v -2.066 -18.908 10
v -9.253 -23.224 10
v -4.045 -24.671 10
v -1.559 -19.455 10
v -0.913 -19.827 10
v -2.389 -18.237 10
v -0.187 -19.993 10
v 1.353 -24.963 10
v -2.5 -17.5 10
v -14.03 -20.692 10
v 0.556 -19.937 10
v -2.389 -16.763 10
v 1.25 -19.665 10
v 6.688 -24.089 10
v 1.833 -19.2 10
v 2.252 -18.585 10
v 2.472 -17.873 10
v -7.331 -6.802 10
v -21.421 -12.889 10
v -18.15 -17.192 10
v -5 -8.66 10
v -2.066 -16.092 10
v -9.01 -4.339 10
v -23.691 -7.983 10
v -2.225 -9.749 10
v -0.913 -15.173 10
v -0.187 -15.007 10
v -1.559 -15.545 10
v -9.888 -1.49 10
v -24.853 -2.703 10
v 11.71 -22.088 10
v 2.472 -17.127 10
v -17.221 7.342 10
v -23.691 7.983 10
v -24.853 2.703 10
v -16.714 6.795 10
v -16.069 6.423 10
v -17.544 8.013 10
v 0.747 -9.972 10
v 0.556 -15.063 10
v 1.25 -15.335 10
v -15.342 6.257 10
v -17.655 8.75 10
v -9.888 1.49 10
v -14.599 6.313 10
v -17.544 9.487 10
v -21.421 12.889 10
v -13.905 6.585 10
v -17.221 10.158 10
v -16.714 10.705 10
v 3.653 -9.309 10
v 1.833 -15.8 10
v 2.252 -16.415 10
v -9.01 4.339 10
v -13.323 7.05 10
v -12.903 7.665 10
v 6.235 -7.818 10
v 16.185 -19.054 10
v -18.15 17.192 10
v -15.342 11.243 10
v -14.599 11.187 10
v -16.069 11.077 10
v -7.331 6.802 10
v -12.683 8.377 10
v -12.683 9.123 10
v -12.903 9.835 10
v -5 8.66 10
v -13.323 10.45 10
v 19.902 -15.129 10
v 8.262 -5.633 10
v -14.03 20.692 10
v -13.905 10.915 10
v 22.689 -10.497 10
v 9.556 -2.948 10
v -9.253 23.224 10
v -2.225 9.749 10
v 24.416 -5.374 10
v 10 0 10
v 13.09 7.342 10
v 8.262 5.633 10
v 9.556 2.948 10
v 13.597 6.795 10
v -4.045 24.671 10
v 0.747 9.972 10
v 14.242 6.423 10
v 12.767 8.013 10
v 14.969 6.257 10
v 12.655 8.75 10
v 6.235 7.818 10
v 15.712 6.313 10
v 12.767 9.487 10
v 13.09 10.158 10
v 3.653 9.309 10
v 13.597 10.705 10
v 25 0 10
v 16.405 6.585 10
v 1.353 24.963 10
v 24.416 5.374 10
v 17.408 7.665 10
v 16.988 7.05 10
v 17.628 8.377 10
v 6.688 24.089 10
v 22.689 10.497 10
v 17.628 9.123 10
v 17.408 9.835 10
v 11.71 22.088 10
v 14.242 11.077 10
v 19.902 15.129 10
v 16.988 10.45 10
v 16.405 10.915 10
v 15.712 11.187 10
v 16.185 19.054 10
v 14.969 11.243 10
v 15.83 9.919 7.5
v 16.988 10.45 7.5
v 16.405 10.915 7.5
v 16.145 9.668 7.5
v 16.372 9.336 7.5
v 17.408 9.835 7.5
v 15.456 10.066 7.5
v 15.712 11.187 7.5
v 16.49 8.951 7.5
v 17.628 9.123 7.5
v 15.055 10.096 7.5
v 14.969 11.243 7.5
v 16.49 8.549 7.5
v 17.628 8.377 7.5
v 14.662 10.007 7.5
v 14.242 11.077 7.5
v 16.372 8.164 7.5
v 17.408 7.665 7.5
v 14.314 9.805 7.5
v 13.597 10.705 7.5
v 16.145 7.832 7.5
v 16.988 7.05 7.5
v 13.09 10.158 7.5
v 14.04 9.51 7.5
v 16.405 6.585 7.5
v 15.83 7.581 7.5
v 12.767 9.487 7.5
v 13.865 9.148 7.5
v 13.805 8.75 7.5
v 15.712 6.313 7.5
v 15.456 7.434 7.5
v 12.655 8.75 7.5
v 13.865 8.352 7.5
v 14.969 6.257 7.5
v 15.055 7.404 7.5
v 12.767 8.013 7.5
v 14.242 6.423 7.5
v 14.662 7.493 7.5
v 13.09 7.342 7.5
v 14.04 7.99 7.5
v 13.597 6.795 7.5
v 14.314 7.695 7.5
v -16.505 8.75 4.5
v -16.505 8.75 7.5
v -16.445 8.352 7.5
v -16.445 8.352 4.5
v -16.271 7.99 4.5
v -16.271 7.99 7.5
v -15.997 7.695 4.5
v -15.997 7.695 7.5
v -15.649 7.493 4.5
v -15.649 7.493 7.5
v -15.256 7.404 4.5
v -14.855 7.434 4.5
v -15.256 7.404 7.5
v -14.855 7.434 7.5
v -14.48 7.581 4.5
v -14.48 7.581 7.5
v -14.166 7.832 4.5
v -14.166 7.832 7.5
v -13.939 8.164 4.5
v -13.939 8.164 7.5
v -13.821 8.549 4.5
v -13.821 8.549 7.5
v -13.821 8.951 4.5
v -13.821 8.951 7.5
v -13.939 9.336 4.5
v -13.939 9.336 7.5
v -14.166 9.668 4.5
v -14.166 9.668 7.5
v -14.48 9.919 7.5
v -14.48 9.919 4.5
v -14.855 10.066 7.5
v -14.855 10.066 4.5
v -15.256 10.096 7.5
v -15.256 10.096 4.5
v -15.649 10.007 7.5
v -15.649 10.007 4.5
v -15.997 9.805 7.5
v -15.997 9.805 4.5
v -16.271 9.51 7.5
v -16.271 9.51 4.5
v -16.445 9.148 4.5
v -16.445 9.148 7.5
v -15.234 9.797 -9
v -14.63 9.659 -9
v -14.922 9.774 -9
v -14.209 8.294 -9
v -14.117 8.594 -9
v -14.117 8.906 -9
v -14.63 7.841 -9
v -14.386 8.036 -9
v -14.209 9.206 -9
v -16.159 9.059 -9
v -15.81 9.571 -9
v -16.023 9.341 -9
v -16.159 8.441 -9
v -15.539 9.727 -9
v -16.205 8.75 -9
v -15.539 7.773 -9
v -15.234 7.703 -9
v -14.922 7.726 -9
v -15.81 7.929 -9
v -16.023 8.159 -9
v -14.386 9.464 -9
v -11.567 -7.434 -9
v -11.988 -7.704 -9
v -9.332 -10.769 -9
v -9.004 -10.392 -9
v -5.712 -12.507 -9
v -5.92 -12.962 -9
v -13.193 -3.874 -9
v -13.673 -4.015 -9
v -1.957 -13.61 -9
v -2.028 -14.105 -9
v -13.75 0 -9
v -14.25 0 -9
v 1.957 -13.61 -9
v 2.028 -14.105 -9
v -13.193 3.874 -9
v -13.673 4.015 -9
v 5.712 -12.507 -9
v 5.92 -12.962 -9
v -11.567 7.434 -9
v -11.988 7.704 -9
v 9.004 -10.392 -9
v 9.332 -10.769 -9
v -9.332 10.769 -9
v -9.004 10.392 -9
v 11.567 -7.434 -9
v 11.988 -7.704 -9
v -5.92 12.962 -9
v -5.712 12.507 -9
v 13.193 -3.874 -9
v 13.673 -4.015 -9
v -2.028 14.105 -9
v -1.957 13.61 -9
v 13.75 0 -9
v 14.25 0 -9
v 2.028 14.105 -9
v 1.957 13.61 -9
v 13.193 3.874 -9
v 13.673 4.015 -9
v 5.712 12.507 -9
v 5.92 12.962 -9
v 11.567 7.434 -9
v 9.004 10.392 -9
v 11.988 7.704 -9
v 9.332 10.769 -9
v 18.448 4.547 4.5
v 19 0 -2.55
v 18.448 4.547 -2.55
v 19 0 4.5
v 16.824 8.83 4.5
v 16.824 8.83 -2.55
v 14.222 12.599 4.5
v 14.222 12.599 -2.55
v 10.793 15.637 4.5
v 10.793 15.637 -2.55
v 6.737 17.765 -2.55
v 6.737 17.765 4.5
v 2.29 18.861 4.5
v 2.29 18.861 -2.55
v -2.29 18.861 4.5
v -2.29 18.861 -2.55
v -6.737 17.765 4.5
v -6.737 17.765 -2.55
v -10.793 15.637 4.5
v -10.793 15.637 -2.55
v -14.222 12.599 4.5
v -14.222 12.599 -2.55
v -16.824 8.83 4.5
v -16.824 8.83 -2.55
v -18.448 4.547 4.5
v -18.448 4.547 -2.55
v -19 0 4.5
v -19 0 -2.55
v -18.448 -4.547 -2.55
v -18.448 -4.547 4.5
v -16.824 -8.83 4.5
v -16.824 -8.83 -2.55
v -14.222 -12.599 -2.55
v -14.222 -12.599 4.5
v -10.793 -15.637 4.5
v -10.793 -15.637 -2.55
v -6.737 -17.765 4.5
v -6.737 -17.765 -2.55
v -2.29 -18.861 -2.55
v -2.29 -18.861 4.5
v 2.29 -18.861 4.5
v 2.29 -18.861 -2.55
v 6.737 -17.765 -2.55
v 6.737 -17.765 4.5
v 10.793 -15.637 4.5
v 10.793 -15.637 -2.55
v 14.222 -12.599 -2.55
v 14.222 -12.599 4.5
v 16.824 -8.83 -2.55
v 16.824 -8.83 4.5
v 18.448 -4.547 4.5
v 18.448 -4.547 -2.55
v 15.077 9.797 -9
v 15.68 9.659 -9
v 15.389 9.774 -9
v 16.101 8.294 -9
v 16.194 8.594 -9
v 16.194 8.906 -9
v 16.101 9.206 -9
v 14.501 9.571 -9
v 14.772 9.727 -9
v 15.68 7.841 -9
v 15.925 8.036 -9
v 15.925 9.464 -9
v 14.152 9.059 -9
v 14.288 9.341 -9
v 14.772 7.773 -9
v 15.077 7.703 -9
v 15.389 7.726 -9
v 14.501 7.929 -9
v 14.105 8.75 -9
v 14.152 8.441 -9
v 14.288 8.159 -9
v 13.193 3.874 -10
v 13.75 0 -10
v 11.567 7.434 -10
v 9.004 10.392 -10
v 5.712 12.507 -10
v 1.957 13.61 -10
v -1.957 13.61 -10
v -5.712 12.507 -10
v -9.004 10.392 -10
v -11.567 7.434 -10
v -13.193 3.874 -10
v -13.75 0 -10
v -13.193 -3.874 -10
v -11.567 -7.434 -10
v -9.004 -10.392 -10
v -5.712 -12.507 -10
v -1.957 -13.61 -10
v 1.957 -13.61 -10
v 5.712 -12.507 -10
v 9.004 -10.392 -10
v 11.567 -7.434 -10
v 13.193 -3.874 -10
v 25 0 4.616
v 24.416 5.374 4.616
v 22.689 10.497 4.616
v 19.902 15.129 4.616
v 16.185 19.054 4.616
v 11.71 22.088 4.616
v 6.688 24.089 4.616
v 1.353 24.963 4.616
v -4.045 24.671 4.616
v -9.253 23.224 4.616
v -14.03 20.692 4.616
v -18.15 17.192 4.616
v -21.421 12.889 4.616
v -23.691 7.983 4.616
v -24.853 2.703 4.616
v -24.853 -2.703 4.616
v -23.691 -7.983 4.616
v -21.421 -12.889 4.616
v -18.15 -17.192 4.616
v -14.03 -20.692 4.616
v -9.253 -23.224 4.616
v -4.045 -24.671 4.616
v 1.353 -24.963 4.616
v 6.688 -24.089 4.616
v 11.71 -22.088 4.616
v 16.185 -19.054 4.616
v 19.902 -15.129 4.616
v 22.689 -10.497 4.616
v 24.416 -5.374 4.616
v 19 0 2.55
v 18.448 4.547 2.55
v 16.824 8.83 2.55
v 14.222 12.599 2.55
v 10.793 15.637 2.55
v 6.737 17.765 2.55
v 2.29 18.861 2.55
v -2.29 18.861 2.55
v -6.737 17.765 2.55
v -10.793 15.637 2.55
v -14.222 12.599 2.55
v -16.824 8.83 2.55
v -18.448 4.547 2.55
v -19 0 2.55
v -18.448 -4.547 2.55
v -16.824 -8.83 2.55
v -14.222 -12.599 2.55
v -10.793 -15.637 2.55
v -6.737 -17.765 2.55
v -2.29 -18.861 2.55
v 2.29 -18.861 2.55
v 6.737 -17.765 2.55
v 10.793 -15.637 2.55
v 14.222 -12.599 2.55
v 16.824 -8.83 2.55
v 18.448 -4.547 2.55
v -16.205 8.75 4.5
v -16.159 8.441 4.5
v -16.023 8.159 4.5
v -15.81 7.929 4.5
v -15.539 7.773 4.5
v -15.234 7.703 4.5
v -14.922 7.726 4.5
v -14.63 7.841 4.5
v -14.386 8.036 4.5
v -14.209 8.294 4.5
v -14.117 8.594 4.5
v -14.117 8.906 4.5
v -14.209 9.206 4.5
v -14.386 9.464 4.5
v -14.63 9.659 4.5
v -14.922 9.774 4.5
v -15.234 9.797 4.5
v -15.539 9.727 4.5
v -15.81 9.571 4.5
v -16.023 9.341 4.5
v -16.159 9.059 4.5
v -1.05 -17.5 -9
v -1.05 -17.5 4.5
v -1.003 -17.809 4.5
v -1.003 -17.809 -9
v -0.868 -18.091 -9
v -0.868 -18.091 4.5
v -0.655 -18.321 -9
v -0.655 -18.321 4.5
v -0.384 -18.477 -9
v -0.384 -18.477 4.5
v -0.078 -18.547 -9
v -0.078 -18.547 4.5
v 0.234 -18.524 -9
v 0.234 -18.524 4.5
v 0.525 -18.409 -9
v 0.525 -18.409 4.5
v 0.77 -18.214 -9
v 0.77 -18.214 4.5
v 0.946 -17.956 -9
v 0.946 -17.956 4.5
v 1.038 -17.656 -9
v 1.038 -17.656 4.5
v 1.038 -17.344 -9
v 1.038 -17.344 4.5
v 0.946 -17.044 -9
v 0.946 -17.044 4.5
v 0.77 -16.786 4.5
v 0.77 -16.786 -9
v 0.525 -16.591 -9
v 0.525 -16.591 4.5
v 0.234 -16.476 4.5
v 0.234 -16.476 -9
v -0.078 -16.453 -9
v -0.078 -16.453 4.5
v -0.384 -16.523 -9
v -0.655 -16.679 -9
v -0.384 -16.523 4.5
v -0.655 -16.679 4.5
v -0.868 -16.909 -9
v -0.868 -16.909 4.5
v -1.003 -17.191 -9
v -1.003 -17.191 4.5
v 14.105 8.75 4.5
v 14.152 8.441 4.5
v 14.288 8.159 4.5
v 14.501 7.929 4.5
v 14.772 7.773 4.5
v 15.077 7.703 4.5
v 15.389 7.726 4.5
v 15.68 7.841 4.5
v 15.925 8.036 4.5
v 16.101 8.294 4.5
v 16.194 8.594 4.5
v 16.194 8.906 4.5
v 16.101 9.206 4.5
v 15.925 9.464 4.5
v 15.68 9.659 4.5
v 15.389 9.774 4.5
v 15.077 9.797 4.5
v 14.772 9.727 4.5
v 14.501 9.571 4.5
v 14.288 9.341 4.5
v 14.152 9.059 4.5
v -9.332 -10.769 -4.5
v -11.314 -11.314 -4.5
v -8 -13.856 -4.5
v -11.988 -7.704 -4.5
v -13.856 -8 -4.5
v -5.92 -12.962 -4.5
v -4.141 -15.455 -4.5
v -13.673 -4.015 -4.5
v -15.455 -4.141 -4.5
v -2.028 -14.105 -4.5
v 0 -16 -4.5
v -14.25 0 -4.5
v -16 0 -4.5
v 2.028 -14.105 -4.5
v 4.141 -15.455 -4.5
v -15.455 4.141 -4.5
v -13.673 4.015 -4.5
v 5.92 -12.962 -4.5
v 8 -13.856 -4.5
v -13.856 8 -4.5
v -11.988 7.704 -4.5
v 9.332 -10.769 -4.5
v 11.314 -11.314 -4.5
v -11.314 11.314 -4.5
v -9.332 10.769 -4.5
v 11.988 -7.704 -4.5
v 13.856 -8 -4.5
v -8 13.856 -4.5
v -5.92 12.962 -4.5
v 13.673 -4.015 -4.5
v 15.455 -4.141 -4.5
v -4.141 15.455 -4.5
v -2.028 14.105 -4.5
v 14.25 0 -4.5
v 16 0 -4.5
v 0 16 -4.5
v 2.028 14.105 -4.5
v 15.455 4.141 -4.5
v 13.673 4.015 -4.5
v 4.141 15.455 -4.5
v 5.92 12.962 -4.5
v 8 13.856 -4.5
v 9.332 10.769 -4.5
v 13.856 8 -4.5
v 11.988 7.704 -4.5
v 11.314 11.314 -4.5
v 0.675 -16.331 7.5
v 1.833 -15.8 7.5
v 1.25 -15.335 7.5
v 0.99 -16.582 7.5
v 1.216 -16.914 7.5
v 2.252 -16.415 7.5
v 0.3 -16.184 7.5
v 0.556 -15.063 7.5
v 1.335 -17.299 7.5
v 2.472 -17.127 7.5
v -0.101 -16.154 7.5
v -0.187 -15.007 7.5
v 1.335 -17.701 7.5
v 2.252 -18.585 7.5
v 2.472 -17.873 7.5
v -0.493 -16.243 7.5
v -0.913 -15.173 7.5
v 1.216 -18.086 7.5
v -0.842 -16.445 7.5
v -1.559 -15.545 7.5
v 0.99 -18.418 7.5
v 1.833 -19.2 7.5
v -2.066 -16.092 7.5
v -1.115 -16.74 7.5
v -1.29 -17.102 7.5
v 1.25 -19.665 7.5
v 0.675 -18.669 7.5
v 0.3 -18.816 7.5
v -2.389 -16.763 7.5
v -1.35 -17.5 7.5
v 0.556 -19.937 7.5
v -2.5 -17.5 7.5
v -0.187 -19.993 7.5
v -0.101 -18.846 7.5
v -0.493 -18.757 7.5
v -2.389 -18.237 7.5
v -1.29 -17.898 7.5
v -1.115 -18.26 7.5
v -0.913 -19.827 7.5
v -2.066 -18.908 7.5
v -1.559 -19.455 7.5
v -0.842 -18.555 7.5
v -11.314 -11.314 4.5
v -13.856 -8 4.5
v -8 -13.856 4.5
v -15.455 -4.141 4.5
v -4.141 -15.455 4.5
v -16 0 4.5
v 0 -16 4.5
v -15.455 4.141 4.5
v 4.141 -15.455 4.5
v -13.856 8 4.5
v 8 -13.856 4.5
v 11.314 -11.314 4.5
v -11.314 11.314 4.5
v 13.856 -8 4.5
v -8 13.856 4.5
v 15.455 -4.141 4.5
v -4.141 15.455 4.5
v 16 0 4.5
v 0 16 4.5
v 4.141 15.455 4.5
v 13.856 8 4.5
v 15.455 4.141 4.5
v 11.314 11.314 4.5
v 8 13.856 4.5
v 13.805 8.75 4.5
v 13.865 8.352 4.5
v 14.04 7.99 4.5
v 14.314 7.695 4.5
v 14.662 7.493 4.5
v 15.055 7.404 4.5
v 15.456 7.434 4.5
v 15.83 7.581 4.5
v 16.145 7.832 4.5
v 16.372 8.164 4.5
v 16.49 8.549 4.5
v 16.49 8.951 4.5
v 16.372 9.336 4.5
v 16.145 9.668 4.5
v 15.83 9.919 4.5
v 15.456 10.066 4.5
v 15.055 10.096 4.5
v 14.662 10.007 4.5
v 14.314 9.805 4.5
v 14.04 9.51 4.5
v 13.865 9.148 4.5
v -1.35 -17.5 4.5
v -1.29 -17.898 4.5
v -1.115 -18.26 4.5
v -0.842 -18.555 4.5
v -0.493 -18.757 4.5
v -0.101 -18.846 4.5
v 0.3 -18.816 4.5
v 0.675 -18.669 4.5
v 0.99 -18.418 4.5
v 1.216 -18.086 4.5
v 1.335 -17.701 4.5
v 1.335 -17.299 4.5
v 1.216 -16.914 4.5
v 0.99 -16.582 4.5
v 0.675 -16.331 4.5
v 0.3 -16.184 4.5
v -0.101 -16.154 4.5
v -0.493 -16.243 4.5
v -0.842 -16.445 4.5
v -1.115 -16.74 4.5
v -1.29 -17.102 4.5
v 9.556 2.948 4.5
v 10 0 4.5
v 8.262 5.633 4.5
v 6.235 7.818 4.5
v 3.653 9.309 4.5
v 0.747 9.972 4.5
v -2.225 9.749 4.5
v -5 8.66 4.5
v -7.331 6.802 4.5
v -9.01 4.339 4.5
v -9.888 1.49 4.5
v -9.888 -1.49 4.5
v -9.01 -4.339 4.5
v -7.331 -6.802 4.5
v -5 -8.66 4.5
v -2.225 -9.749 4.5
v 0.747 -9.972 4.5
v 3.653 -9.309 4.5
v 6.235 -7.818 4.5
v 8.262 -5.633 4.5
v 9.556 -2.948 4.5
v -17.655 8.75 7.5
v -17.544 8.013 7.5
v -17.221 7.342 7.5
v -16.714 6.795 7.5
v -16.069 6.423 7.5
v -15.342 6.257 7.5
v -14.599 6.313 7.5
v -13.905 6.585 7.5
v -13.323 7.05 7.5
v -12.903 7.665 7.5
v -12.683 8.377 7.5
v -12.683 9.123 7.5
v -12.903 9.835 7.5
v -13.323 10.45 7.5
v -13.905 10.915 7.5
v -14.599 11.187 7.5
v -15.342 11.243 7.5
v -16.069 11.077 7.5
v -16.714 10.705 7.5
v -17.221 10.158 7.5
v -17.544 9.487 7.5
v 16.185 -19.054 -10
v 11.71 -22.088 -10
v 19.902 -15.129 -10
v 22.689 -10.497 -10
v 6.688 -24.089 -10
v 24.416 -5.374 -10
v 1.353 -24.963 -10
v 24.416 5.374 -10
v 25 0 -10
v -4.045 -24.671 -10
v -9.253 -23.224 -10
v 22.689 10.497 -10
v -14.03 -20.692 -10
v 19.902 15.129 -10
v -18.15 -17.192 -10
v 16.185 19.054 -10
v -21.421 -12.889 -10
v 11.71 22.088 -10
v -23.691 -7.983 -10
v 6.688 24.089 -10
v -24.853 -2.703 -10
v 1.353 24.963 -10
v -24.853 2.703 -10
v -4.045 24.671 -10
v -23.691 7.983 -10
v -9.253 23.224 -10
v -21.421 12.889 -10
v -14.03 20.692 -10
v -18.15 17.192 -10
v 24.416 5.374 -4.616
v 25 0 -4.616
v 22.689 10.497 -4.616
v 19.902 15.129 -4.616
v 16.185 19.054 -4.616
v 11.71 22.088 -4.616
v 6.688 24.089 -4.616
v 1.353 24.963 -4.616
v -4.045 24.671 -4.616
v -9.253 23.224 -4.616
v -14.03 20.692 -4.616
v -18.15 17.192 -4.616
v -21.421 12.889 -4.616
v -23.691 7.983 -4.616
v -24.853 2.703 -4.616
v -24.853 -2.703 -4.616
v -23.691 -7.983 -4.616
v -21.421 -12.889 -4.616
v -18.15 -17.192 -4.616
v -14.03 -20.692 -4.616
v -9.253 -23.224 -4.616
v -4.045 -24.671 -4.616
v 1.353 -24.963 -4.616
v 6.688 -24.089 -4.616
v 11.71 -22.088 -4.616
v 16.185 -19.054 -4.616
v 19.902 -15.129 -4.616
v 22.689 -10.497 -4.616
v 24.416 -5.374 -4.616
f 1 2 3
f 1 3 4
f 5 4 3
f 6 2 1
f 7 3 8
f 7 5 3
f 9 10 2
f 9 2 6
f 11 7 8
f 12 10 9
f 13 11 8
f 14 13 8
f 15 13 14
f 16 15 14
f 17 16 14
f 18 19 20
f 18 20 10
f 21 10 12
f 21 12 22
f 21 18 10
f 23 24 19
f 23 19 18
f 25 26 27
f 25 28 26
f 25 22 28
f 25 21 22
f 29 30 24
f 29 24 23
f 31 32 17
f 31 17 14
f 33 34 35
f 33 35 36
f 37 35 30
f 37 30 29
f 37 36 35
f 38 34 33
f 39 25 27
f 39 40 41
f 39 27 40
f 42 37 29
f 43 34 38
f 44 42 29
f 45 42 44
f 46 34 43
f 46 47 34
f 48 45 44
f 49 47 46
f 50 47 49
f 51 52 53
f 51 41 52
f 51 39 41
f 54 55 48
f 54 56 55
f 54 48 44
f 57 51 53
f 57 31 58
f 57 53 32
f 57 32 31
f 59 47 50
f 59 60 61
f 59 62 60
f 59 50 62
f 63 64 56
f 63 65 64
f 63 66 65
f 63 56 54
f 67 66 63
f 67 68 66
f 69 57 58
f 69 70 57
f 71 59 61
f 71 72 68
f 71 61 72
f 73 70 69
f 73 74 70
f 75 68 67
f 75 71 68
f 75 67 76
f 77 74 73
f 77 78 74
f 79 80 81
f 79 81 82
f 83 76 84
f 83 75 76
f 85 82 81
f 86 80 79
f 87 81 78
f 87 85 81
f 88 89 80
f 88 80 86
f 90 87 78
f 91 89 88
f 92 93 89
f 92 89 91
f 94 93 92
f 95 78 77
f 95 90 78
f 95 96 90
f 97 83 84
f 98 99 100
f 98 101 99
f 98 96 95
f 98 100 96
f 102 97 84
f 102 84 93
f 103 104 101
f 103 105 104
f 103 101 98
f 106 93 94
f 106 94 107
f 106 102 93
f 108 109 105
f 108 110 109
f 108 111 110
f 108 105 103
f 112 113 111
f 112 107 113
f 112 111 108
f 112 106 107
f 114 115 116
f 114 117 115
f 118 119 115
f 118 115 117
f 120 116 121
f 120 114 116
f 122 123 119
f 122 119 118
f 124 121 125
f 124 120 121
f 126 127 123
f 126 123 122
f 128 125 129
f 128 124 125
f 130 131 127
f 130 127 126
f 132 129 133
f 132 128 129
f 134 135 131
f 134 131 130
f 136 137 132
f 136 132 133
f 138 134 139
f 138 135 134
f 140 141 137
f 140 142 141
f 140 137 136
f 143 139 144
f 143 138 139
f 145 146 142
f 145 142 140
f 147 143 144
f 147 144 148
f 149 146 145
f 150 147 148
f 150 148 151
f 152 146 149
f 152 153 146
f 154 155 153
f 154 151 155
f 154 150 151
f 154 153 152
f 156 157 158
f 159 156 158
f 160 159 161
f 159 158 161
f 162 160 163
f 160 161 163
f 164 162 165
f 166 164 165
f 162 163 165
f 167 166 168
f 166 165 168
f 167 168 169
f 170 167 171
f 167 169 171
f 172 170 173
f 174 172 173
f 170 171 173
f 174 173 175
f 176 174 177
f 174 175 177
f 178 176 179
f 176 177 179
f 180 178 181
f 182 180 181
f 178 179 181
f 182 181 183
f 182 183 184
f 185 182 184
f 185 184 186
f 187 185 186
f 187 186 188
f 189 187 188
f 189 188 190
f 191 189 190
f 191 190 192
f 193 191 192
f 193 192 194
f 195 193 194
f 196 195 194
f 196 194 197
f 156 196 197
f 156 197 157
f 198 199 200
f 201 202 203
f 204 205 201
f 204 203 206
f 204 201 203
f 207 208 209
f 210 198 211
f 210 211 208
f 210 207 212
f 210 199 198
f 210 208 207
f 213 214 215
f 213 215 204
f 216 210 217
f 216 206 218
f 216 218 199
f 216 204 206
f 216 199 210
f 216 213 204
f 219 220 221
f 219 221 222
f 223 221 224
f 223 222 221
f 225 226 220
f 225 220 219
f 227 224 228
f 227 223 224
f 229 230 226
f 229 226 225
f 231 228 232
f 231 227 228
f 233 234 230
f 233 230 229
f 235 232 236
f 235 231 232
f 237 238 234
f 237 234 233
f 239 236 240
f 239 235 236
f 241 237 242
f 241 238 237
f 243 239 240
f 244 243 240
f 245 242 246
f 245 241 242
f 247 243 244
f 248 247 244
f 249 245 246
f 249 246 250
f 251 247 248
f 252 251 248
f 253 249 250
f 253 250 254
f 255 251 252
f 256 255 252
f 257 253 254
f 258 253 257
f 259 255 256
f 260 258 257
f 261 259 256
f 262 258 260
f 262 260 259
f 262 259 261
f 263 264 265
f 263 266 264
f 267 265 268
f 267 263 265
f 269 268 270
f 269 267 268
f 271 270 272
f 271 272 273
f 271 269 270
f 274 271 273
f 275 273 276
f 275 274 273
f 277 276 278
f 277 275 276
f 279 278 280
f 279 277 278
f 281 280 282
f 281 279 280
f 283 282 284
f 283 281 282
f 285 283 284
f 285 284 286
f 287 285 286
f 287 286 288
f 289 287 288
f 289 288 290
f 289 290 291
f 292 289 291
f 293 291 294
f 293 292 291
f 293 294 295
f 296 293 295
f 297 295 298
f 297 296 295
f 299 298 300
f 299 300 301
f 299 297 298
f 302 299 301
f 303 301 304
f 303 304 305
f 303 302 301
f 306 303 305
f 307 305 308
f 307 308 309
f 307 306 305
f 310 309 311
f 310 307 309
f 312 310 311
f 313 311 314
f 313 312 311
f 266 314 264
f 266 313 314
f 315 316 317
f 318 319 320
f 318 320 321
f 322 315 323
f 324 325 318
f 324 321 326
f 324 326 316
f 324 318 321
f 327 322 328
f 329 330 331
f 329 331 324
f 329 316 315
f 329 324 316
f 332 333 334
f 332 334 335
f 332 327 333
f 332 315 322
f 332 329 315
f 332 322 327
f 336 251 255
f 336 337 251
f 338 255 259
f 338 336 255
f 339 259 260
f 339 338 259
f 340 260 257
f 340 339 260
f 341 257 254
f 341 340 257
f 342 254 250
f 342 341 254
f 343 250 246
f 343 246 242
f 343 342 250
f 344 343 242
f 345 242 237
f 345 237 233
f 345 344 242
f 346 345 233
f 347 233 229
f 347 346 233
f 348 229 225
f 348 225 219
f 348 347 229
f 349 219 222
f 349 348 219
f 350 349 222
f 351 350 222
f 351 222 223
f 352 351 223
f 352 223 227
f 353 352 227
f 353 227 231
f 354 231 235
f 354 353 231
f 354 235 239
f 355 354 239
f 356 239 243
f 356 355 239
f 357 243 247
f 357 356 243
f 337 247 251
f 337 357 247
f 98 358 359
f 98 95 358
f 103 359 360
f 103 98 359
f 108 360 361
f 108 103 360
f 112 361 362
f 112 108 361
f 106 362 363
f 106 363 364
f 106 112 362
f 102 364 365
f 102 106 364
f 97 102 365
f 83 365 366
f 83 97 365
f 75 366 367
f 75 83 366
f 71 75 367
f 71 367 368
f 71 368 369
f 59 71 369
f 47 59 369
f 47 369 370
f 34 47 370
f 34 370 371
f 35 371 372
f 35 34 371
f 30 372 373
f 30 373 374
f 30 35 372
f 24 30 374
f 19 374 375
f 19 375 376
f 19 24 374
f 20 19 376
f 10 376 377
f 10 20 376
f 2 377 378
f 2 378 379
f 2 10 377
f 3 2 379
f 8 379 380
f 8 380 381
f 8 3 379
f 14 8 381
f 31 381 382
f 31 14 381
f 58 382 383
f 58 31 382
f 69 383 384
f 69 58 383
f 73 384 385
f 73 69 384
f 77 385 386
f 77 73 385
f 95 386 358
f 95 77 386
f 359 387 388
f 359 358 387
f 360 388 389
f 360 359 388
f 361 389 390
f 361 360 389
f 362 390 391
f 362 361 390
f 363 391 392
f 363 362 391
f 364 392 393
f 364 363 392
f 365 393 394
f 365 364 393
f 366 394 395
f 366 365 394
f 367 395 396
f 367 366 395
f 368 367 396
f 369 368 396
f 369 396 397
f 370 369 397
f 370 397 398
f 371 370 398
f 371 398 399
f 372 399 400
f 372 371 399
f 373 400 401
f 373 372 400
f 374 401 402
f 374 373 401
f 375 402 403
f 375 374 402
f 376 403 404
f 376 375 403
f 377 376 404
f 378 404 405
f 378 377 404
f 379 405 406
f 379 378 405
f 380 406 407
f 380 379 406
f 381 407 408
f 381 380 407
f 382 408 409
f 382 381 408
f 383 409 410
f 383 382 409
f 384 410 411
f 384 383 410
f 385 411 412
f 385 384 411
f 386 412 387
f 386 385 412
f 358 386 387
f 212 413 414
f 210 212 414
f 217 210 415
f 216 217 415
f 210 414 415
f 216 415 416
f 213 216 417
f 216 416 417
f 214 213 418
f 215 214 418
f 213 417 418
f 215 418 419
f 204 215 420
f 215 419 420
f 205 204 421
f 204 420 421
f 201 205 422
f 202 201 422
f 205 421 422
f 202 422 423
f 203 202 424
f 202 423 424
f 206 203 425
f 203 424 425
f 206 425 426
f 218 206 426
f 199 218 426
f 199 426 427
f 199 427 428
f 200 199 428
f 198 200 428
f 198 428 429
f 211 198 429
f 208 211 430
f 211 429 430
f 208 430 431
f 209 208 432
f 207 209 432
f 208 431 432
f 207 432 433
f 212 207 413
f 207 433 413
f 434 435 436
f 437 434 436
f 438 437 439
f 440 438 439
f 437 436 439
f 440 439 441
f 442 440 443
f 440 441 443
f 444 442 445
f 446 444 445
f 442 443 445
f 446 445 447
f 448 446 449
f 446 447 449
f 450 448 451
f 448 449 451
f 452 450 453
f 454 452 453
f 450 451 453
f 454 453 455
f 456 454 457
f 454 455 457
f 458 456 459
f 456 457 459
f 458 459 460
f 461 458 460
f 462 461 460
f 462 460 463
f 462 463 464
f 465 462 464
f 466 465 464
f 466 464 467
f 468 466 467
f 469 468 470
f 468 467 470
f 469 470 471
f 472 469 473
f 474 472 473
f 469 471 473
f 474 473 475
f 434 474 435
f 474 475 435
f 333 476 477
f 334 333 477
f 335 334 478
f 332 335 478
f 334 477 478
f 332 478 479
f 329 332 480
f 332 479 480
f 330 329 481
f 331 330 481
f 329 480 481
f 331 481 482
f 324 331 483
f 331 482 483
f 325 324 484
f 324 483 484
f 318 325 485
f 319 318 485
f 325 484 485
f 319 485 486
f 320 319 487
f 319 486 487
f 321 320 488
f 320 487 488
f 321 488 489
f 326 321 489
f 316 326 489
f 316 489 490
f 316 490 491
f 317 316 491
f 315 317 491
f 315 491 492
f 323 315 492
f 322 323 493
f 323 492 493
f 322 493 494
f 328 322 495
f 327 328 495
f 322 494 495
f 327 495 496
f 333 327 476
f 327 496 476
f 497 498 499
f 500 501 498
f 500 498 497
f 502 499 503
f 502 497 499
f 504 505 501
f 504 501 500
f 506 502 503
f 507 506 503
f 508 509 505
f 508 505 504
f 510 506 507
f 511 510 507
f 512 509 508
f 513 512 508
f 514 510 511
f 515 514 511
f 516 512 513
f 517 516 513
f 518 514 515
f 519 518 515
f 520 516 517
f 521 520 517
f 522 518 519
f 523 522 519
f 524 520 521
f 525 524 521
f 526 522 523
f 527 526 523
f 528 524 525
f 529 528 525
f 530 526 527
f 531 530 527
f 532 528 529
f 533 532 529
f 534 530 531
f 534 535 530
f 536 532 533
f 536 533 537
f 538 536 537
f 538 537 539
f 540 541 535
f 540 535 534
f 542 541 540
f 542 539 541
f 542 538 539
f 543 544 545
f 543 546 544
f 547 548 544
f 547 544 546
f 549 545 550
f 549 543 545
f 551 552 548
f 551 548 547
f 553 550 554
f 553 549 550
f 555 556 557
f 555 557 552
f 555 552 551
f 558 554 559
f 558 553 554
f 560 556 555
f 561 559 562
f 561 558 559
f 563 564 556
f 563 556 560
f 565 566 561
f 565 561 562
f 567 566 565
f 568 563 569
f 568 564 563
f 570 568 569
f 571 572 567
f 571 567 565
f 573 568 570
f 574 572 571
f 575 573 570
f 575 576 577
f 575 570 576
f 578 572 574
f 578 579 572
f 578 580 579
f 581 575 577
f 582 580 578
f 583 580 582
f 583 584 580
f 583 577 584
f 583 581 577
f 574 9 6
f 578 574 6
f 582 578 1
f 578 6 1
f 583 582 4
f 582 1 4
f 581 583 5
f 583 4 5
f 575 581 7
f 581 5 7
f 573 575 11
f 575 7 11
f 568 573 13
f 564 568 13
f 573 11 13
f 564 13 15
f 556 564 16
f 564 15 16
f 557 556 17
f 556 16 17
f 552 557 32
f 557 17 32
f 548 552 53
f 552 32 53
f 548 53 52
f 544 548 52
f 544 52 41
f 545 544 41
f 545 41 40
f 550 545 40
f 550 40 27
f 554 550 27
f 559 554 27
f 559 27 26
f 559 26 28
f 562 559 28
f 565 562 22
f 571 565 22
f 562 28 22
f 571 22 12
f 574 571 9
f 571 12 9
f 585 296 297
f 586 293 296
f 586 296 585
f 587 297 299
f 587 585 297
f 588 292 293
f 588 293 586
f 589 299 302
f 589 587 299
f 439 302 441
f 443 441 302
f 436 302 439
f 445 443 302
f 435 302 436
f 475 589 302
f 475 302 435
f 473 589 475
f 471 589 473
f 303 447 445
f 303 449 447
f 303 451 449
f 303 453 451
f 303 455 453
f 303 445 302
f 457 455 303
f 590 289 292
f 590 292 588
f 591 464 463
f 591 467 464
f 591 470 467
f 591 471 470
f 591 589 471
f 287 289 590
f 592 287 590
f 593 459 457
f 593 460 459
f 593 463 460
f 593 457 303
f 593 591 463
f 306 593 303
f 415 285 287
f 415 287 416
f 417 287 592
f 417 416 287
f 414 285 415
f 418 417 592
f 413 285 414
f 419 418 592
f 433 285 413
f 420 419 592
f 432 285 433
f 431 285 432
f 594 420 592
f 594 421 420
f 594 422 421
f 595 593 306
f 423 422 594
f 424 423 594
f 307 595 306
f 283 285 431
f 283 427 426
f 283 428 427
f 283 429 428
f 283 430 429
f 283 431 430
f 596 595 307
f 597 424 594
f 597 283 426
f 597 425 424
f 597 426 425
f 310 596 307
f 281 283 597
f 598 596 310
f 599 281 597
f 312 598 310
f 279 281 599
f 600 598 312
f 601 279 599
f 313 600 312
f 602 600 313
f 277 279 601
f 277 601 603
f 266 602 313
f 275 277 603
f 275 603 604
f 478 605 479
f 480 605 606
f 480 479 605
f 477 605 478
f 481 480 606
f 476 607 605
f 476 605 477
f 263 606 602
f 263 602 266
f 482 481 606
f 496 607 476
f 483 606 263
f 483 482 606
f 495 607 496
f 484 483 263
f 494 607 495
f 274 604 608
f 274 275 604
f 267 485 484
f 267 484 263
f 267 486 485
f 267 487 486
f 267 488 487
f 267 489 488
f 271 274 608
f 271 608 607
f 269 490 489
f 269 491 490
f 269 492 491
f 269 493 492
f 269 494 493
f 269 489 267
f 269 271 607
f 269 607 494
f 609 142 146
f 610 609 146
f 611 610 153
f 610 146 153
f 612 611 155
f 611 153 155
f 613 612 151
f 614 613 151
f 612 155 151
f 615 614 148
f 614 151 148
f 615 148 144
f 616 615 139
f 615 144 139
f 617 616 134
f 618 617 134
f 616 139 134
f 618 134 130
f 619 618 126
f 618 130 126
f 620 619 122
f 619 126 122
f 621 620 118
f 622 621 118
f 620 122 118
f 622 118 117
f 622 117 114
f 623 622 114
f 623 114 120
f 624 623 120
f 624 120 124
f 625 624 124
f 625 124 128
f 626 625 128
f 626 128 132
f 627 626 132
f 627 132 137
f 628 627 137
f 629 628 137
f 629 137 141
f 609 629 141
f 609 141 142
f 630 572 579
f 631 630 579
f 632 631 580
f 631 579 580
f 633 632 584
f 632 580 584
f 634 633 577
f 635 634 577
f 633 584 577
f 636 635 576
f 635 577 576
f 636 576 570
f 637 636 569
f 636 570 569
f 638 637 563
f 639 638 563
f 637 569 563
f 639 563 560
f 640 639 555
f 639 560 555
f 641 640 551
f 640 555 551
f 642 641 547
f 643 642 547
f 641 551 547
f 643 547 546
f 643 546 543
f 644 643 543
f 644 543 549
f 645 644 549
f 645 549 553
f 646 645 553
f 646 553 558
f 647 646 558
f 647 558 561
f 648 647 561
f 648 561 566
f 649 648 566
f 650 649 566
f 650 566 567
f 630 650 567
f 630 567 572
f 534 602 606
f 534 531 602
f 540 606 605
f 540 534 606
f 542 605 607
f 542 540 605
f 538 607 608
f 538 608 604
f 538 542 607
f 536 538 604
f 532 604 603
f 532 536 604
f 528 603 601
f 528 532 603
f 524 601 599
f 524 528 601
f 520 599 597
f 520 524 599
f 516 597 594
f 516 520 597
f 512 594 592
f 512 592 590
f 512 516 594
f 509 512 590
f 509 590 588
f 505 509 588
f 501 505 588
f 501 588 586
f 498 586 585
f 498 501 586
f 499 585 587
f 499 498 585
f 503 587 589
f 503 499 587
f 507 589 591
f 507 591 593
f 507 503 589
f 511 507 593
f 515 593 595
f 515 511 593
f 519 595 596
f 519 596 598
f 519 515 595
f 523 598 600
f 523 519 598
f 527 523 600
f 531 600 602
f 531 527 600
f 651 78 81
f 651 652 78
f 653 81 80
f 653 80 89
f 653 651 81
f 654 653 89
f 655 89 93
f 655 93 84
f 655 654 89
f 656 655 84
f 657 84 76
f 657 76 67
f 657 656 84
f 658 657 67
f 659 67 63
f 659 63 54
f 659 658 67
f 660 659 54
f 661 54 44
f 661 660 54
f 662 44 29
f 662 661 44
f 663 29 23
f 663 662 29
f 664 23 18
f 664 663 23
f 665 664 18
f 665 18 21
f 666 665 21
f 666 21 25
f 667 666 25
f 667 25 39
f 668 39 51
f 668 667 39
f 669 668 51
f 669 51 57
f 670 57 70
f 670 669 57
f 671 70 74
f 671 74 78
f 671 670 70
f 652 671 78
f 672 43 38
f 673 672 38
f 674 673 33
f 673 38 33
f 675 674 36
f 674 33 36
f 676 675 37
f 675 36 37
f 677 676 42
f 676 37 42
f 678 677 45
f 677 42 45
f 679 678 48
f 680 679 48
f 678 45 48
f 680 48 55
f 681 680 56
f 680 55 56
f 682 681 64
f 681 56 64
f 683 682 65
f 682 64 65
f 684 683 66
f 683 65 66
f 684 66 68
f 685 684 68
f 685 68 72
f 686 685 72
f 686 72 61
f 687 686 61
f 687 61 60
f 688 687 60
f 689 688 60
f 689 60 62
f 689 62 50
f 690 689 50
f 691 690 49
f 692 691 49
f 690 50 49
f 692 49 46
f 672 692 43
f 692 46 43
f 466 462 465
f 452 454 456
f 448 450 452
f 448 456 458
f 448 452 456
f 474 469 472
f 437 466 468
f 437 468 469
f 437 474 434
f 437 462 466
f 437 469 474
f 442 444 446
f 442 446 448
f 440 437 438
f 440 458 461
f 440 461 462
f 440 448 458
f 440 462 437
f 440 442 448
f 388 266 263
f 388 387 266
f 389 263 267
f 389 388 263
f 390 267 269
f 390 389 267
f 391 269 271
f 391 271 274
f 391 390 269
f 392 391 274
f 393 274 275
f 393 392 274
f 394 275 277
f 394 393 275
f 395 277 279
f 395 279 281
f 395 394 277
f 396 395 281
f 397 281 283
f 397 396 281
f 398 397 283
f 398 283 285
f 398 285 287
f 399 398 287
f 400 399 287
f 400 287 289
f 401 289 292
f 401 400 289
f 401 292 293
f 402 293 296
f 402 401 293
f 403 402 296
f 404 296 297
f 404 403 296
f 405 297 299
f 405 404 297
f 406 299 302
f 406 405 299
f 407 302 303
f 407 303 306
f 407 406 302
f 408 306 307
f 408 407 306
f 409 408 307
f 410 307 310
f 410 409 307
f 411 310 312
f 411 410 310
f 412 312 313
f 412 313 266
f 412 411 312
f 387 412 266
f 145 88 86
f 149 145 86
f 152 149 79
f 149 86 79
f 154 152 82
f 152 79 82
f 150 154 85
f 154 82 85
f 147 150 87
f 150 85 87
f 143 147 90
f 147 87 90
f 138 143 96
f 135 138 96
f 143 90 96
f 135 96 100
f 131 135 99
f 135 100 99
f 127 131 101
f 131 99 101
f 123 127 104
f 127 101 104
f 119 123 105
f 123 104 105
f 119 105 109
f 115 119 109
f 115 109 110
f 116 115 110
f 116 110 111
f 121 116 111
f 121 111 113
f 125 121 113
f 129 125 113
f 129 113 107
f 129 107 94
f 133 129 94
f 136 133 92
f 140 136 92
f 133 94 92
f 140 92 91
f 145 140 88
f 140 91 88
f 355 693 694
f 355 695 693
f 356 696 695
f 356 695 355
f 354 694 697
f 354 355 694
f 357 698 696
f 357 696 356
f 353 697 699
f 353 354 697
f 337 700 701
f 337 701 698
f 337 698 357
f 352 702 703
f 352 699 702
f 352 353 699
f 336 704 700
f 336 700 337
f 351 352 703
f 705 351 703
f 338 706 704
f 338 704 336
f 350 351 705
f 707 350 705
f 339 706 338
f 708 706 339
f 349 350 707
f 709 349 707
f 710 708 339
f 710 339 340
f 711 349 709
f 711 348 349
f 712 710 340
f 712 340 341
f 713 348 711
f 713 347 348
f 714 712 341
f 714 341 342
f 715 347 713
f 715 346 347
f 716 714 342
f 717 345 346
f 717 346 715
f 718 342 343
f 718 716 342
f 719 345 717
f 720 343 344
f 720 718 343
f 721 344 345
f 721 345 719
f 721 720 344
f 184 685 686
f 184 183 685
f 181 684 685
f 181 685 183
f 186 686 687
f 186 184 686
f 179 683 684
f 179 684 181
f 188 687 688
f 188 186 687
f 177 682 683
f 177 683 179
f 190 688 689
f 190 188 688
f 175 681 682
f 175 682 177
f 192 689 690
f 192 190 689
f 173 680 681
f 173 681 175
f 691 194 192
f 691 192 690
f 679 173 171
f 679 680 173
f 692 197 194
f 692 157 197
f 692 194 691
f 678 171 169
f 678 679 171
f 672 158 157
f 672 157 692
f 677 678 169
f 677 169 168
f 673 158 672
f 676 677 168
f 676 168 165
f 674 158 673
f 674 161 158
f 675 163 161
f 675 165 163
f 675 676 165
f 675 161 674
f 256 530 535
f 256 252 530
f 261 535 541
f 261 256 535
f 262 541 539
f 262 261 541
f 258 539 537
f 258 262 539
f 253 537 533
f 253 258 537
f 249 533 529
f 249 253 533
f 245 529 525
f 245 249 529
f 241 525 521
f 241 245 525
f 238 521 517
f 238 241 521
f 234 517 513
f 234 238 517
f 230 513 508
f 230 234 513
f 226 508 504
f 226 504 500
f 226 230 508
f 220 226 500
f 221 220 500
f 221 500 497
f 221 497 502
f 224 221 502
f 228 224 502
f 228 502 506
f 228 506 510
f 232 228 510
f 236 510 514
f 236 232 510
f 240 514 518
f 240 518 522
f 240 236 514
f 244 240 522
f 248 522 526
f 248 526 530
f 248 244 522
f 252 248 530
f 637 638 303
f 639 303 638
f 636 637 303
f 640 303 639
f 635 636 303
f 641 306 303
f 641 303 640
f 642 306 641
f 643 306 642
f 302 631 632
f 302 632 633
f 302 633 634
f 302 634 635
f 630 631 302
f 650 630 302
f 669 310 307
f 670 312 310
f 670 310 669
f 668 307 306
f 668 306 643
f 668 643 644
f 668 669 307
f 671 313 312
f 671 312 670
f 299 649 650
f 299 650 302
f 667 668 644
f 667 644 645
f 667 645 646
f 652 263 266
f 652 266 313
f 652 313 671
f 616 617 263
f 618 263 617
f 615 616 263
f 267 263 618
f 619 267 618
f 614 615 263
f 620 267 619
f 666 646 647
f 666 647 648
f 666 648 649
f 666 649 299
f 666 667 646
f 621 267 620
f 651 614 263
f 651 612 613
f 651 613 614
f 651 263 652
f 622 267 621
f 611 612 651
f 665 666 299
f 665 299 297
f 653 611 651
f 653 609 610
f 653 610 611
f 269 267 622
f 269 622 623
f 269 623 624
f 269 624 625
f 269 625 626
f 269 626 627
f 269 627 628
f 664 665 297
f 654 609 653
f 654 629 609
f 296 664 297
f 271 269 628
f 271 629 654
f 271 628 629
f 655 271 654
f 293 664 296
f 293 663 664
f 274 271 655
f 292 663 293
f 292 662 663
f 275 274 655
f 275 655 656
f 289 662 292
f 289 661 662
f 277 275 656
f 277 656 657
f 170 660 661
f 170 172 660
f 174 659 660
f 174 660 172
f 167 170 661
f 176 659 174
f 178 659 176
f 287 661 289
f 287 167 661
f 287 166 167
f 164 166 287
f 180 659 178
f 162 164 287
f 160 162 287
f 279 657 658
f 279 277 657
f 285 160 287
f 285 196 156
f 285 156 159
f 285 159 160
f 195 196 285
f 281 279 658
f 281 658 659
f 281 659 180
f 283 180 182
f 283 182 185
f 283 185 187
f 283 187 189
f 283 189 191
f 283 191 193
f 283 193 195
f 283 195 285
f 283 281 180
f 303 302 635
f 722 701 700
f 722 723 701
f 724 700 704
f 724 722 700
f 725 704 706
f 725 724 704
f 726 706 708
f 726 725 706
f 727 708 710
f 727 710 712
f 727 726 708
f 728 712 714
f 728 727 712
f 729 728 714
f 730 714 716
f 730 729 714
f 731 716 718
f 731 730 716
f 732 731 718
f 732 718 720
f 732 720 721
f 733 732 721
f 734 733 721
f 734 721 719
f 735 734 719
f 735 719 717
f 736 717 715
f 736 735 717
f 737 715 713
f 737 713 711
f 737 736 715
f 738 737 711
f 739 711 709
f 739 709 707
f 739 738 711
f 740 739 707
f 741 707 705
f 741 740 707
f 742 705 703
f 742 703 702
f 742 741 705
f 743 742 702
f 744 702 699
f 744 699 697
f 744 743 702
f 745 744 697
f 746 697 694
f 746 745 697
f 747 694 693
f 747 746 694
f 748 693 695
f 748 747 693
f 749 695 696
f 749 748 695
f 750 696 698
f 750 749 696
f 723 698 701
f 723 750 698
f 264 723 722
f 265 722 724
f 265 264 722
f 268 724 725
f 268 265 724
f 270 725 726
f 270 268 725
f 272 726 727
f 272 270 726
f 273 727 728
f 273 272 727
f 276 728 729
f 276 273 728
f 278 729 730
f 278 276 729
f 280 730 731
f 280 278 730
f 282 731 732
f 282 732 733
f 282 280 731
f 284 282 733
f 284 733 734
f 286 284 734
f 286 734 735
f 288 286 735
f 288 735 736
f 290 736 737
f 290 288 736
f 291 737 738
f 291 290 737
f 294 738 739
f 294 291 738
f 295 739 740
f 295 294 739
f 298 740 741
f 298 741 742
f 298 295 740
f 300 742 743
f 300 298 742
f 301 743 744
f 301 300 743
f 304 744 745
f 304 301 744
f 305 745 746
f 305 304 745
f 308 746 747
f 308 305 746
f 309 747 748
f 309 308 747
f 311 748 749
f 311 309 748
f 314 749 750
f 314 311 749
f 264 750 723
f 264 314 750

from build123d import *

# Parameters (mm, degrees)
SKETCH003_R     = 1.05
POCKET001_DEPTH = 13.5
SKETCH004_R     = 1.35
POCKET_DEPTH    = 7.451
SKETCH005_R     = 2.5
POCKET002_DEPTH = 2.5


with BuildPart() as f_2_screwholes_pocket:
    # Sketch → Revolution001 (revolve)
    with BuildSketch(Plane.XZ):
        Polygon((13.75, -10), (25, -10), (25, -4.615966), (19, -2.55), (19, 4.5), (16, 4.5), (16, -4.5), (14.25, -4.5), (14.25, -9), (13.75, -9), align=None)
    revolve(axis=Axis((0, 0, 0), (0, 0, 1)))

    # Sketch003 → Pocket001 (cut)
    with BuildSketch(Plane(origin=(0, 0, 4.5), x_dir=(-1, 0, 0), z_dir=(0, 0, 1))):
        with Locations((0, 17.5)):
            Circle(SKETCH003_R)
        with Locations((-15.155445, -8.75)):
            Circle(SKETCH003_R)
        with Locations((15.155445, -8.75)):
            Circle(SKETCH003_R)
    extrude(amount=-POCKET001_DEPTH, mode=Mode.SUBTRACT)


with BuildPart() as f_3_screwcounterboreholes_pocket:
    # Sketch001 → Revolution (revolve)
    with BuildSketch(Plane.XZ):
        Polygon((19, 2.55), (25, 4.615966), (25, 10), (10, 10), (10, 4.5), (19, 4.5), align=None)
    revolve(axis=Axis((0, 0, 0), (0, 0, 1)))

    # Sketch004 → Pocket (cut, through all)
    with BuildSketch(Plane(origin=(0, 0, 10), x_dir=(-1, 0, 0), z_dir=(0, 0, 1))):
        with Locations((0, 17.5)):
            Circle(SKETCH004_R)
        with Locations((-15.155445, -8.75)):
            Circle(SKETCH004_R)
        with Locations((15.155445, -8.75)):
            Circle(SKETCH004_R)
    extrude(amount=-POCKET_DEPTH, mode=Mode.SUBTRACT)

    # Sketch005 → Pocket002 (cut)
    with BuildSketch(Plane(origin=(0, 0, 10), x_dir=(-1, 0, 0), z_dir=(0, 0, 1))):
        with Locations((0, 17.5)):
            Circle(SKETCH005_R)
        with Locations((-15.155445, -8.75)):
            Circle(SKETCH005_R)
        with Locations((15.155445, -8.75)):
            Circle(SKETCH005_R)
    extrude(amount=-POCKET002_DEPTH, mode=Mode.SUBTRACT)


solid = Compound([f_2_screwholes_pocket.part, f_3_screwcounterboreholes_pocket.part])
